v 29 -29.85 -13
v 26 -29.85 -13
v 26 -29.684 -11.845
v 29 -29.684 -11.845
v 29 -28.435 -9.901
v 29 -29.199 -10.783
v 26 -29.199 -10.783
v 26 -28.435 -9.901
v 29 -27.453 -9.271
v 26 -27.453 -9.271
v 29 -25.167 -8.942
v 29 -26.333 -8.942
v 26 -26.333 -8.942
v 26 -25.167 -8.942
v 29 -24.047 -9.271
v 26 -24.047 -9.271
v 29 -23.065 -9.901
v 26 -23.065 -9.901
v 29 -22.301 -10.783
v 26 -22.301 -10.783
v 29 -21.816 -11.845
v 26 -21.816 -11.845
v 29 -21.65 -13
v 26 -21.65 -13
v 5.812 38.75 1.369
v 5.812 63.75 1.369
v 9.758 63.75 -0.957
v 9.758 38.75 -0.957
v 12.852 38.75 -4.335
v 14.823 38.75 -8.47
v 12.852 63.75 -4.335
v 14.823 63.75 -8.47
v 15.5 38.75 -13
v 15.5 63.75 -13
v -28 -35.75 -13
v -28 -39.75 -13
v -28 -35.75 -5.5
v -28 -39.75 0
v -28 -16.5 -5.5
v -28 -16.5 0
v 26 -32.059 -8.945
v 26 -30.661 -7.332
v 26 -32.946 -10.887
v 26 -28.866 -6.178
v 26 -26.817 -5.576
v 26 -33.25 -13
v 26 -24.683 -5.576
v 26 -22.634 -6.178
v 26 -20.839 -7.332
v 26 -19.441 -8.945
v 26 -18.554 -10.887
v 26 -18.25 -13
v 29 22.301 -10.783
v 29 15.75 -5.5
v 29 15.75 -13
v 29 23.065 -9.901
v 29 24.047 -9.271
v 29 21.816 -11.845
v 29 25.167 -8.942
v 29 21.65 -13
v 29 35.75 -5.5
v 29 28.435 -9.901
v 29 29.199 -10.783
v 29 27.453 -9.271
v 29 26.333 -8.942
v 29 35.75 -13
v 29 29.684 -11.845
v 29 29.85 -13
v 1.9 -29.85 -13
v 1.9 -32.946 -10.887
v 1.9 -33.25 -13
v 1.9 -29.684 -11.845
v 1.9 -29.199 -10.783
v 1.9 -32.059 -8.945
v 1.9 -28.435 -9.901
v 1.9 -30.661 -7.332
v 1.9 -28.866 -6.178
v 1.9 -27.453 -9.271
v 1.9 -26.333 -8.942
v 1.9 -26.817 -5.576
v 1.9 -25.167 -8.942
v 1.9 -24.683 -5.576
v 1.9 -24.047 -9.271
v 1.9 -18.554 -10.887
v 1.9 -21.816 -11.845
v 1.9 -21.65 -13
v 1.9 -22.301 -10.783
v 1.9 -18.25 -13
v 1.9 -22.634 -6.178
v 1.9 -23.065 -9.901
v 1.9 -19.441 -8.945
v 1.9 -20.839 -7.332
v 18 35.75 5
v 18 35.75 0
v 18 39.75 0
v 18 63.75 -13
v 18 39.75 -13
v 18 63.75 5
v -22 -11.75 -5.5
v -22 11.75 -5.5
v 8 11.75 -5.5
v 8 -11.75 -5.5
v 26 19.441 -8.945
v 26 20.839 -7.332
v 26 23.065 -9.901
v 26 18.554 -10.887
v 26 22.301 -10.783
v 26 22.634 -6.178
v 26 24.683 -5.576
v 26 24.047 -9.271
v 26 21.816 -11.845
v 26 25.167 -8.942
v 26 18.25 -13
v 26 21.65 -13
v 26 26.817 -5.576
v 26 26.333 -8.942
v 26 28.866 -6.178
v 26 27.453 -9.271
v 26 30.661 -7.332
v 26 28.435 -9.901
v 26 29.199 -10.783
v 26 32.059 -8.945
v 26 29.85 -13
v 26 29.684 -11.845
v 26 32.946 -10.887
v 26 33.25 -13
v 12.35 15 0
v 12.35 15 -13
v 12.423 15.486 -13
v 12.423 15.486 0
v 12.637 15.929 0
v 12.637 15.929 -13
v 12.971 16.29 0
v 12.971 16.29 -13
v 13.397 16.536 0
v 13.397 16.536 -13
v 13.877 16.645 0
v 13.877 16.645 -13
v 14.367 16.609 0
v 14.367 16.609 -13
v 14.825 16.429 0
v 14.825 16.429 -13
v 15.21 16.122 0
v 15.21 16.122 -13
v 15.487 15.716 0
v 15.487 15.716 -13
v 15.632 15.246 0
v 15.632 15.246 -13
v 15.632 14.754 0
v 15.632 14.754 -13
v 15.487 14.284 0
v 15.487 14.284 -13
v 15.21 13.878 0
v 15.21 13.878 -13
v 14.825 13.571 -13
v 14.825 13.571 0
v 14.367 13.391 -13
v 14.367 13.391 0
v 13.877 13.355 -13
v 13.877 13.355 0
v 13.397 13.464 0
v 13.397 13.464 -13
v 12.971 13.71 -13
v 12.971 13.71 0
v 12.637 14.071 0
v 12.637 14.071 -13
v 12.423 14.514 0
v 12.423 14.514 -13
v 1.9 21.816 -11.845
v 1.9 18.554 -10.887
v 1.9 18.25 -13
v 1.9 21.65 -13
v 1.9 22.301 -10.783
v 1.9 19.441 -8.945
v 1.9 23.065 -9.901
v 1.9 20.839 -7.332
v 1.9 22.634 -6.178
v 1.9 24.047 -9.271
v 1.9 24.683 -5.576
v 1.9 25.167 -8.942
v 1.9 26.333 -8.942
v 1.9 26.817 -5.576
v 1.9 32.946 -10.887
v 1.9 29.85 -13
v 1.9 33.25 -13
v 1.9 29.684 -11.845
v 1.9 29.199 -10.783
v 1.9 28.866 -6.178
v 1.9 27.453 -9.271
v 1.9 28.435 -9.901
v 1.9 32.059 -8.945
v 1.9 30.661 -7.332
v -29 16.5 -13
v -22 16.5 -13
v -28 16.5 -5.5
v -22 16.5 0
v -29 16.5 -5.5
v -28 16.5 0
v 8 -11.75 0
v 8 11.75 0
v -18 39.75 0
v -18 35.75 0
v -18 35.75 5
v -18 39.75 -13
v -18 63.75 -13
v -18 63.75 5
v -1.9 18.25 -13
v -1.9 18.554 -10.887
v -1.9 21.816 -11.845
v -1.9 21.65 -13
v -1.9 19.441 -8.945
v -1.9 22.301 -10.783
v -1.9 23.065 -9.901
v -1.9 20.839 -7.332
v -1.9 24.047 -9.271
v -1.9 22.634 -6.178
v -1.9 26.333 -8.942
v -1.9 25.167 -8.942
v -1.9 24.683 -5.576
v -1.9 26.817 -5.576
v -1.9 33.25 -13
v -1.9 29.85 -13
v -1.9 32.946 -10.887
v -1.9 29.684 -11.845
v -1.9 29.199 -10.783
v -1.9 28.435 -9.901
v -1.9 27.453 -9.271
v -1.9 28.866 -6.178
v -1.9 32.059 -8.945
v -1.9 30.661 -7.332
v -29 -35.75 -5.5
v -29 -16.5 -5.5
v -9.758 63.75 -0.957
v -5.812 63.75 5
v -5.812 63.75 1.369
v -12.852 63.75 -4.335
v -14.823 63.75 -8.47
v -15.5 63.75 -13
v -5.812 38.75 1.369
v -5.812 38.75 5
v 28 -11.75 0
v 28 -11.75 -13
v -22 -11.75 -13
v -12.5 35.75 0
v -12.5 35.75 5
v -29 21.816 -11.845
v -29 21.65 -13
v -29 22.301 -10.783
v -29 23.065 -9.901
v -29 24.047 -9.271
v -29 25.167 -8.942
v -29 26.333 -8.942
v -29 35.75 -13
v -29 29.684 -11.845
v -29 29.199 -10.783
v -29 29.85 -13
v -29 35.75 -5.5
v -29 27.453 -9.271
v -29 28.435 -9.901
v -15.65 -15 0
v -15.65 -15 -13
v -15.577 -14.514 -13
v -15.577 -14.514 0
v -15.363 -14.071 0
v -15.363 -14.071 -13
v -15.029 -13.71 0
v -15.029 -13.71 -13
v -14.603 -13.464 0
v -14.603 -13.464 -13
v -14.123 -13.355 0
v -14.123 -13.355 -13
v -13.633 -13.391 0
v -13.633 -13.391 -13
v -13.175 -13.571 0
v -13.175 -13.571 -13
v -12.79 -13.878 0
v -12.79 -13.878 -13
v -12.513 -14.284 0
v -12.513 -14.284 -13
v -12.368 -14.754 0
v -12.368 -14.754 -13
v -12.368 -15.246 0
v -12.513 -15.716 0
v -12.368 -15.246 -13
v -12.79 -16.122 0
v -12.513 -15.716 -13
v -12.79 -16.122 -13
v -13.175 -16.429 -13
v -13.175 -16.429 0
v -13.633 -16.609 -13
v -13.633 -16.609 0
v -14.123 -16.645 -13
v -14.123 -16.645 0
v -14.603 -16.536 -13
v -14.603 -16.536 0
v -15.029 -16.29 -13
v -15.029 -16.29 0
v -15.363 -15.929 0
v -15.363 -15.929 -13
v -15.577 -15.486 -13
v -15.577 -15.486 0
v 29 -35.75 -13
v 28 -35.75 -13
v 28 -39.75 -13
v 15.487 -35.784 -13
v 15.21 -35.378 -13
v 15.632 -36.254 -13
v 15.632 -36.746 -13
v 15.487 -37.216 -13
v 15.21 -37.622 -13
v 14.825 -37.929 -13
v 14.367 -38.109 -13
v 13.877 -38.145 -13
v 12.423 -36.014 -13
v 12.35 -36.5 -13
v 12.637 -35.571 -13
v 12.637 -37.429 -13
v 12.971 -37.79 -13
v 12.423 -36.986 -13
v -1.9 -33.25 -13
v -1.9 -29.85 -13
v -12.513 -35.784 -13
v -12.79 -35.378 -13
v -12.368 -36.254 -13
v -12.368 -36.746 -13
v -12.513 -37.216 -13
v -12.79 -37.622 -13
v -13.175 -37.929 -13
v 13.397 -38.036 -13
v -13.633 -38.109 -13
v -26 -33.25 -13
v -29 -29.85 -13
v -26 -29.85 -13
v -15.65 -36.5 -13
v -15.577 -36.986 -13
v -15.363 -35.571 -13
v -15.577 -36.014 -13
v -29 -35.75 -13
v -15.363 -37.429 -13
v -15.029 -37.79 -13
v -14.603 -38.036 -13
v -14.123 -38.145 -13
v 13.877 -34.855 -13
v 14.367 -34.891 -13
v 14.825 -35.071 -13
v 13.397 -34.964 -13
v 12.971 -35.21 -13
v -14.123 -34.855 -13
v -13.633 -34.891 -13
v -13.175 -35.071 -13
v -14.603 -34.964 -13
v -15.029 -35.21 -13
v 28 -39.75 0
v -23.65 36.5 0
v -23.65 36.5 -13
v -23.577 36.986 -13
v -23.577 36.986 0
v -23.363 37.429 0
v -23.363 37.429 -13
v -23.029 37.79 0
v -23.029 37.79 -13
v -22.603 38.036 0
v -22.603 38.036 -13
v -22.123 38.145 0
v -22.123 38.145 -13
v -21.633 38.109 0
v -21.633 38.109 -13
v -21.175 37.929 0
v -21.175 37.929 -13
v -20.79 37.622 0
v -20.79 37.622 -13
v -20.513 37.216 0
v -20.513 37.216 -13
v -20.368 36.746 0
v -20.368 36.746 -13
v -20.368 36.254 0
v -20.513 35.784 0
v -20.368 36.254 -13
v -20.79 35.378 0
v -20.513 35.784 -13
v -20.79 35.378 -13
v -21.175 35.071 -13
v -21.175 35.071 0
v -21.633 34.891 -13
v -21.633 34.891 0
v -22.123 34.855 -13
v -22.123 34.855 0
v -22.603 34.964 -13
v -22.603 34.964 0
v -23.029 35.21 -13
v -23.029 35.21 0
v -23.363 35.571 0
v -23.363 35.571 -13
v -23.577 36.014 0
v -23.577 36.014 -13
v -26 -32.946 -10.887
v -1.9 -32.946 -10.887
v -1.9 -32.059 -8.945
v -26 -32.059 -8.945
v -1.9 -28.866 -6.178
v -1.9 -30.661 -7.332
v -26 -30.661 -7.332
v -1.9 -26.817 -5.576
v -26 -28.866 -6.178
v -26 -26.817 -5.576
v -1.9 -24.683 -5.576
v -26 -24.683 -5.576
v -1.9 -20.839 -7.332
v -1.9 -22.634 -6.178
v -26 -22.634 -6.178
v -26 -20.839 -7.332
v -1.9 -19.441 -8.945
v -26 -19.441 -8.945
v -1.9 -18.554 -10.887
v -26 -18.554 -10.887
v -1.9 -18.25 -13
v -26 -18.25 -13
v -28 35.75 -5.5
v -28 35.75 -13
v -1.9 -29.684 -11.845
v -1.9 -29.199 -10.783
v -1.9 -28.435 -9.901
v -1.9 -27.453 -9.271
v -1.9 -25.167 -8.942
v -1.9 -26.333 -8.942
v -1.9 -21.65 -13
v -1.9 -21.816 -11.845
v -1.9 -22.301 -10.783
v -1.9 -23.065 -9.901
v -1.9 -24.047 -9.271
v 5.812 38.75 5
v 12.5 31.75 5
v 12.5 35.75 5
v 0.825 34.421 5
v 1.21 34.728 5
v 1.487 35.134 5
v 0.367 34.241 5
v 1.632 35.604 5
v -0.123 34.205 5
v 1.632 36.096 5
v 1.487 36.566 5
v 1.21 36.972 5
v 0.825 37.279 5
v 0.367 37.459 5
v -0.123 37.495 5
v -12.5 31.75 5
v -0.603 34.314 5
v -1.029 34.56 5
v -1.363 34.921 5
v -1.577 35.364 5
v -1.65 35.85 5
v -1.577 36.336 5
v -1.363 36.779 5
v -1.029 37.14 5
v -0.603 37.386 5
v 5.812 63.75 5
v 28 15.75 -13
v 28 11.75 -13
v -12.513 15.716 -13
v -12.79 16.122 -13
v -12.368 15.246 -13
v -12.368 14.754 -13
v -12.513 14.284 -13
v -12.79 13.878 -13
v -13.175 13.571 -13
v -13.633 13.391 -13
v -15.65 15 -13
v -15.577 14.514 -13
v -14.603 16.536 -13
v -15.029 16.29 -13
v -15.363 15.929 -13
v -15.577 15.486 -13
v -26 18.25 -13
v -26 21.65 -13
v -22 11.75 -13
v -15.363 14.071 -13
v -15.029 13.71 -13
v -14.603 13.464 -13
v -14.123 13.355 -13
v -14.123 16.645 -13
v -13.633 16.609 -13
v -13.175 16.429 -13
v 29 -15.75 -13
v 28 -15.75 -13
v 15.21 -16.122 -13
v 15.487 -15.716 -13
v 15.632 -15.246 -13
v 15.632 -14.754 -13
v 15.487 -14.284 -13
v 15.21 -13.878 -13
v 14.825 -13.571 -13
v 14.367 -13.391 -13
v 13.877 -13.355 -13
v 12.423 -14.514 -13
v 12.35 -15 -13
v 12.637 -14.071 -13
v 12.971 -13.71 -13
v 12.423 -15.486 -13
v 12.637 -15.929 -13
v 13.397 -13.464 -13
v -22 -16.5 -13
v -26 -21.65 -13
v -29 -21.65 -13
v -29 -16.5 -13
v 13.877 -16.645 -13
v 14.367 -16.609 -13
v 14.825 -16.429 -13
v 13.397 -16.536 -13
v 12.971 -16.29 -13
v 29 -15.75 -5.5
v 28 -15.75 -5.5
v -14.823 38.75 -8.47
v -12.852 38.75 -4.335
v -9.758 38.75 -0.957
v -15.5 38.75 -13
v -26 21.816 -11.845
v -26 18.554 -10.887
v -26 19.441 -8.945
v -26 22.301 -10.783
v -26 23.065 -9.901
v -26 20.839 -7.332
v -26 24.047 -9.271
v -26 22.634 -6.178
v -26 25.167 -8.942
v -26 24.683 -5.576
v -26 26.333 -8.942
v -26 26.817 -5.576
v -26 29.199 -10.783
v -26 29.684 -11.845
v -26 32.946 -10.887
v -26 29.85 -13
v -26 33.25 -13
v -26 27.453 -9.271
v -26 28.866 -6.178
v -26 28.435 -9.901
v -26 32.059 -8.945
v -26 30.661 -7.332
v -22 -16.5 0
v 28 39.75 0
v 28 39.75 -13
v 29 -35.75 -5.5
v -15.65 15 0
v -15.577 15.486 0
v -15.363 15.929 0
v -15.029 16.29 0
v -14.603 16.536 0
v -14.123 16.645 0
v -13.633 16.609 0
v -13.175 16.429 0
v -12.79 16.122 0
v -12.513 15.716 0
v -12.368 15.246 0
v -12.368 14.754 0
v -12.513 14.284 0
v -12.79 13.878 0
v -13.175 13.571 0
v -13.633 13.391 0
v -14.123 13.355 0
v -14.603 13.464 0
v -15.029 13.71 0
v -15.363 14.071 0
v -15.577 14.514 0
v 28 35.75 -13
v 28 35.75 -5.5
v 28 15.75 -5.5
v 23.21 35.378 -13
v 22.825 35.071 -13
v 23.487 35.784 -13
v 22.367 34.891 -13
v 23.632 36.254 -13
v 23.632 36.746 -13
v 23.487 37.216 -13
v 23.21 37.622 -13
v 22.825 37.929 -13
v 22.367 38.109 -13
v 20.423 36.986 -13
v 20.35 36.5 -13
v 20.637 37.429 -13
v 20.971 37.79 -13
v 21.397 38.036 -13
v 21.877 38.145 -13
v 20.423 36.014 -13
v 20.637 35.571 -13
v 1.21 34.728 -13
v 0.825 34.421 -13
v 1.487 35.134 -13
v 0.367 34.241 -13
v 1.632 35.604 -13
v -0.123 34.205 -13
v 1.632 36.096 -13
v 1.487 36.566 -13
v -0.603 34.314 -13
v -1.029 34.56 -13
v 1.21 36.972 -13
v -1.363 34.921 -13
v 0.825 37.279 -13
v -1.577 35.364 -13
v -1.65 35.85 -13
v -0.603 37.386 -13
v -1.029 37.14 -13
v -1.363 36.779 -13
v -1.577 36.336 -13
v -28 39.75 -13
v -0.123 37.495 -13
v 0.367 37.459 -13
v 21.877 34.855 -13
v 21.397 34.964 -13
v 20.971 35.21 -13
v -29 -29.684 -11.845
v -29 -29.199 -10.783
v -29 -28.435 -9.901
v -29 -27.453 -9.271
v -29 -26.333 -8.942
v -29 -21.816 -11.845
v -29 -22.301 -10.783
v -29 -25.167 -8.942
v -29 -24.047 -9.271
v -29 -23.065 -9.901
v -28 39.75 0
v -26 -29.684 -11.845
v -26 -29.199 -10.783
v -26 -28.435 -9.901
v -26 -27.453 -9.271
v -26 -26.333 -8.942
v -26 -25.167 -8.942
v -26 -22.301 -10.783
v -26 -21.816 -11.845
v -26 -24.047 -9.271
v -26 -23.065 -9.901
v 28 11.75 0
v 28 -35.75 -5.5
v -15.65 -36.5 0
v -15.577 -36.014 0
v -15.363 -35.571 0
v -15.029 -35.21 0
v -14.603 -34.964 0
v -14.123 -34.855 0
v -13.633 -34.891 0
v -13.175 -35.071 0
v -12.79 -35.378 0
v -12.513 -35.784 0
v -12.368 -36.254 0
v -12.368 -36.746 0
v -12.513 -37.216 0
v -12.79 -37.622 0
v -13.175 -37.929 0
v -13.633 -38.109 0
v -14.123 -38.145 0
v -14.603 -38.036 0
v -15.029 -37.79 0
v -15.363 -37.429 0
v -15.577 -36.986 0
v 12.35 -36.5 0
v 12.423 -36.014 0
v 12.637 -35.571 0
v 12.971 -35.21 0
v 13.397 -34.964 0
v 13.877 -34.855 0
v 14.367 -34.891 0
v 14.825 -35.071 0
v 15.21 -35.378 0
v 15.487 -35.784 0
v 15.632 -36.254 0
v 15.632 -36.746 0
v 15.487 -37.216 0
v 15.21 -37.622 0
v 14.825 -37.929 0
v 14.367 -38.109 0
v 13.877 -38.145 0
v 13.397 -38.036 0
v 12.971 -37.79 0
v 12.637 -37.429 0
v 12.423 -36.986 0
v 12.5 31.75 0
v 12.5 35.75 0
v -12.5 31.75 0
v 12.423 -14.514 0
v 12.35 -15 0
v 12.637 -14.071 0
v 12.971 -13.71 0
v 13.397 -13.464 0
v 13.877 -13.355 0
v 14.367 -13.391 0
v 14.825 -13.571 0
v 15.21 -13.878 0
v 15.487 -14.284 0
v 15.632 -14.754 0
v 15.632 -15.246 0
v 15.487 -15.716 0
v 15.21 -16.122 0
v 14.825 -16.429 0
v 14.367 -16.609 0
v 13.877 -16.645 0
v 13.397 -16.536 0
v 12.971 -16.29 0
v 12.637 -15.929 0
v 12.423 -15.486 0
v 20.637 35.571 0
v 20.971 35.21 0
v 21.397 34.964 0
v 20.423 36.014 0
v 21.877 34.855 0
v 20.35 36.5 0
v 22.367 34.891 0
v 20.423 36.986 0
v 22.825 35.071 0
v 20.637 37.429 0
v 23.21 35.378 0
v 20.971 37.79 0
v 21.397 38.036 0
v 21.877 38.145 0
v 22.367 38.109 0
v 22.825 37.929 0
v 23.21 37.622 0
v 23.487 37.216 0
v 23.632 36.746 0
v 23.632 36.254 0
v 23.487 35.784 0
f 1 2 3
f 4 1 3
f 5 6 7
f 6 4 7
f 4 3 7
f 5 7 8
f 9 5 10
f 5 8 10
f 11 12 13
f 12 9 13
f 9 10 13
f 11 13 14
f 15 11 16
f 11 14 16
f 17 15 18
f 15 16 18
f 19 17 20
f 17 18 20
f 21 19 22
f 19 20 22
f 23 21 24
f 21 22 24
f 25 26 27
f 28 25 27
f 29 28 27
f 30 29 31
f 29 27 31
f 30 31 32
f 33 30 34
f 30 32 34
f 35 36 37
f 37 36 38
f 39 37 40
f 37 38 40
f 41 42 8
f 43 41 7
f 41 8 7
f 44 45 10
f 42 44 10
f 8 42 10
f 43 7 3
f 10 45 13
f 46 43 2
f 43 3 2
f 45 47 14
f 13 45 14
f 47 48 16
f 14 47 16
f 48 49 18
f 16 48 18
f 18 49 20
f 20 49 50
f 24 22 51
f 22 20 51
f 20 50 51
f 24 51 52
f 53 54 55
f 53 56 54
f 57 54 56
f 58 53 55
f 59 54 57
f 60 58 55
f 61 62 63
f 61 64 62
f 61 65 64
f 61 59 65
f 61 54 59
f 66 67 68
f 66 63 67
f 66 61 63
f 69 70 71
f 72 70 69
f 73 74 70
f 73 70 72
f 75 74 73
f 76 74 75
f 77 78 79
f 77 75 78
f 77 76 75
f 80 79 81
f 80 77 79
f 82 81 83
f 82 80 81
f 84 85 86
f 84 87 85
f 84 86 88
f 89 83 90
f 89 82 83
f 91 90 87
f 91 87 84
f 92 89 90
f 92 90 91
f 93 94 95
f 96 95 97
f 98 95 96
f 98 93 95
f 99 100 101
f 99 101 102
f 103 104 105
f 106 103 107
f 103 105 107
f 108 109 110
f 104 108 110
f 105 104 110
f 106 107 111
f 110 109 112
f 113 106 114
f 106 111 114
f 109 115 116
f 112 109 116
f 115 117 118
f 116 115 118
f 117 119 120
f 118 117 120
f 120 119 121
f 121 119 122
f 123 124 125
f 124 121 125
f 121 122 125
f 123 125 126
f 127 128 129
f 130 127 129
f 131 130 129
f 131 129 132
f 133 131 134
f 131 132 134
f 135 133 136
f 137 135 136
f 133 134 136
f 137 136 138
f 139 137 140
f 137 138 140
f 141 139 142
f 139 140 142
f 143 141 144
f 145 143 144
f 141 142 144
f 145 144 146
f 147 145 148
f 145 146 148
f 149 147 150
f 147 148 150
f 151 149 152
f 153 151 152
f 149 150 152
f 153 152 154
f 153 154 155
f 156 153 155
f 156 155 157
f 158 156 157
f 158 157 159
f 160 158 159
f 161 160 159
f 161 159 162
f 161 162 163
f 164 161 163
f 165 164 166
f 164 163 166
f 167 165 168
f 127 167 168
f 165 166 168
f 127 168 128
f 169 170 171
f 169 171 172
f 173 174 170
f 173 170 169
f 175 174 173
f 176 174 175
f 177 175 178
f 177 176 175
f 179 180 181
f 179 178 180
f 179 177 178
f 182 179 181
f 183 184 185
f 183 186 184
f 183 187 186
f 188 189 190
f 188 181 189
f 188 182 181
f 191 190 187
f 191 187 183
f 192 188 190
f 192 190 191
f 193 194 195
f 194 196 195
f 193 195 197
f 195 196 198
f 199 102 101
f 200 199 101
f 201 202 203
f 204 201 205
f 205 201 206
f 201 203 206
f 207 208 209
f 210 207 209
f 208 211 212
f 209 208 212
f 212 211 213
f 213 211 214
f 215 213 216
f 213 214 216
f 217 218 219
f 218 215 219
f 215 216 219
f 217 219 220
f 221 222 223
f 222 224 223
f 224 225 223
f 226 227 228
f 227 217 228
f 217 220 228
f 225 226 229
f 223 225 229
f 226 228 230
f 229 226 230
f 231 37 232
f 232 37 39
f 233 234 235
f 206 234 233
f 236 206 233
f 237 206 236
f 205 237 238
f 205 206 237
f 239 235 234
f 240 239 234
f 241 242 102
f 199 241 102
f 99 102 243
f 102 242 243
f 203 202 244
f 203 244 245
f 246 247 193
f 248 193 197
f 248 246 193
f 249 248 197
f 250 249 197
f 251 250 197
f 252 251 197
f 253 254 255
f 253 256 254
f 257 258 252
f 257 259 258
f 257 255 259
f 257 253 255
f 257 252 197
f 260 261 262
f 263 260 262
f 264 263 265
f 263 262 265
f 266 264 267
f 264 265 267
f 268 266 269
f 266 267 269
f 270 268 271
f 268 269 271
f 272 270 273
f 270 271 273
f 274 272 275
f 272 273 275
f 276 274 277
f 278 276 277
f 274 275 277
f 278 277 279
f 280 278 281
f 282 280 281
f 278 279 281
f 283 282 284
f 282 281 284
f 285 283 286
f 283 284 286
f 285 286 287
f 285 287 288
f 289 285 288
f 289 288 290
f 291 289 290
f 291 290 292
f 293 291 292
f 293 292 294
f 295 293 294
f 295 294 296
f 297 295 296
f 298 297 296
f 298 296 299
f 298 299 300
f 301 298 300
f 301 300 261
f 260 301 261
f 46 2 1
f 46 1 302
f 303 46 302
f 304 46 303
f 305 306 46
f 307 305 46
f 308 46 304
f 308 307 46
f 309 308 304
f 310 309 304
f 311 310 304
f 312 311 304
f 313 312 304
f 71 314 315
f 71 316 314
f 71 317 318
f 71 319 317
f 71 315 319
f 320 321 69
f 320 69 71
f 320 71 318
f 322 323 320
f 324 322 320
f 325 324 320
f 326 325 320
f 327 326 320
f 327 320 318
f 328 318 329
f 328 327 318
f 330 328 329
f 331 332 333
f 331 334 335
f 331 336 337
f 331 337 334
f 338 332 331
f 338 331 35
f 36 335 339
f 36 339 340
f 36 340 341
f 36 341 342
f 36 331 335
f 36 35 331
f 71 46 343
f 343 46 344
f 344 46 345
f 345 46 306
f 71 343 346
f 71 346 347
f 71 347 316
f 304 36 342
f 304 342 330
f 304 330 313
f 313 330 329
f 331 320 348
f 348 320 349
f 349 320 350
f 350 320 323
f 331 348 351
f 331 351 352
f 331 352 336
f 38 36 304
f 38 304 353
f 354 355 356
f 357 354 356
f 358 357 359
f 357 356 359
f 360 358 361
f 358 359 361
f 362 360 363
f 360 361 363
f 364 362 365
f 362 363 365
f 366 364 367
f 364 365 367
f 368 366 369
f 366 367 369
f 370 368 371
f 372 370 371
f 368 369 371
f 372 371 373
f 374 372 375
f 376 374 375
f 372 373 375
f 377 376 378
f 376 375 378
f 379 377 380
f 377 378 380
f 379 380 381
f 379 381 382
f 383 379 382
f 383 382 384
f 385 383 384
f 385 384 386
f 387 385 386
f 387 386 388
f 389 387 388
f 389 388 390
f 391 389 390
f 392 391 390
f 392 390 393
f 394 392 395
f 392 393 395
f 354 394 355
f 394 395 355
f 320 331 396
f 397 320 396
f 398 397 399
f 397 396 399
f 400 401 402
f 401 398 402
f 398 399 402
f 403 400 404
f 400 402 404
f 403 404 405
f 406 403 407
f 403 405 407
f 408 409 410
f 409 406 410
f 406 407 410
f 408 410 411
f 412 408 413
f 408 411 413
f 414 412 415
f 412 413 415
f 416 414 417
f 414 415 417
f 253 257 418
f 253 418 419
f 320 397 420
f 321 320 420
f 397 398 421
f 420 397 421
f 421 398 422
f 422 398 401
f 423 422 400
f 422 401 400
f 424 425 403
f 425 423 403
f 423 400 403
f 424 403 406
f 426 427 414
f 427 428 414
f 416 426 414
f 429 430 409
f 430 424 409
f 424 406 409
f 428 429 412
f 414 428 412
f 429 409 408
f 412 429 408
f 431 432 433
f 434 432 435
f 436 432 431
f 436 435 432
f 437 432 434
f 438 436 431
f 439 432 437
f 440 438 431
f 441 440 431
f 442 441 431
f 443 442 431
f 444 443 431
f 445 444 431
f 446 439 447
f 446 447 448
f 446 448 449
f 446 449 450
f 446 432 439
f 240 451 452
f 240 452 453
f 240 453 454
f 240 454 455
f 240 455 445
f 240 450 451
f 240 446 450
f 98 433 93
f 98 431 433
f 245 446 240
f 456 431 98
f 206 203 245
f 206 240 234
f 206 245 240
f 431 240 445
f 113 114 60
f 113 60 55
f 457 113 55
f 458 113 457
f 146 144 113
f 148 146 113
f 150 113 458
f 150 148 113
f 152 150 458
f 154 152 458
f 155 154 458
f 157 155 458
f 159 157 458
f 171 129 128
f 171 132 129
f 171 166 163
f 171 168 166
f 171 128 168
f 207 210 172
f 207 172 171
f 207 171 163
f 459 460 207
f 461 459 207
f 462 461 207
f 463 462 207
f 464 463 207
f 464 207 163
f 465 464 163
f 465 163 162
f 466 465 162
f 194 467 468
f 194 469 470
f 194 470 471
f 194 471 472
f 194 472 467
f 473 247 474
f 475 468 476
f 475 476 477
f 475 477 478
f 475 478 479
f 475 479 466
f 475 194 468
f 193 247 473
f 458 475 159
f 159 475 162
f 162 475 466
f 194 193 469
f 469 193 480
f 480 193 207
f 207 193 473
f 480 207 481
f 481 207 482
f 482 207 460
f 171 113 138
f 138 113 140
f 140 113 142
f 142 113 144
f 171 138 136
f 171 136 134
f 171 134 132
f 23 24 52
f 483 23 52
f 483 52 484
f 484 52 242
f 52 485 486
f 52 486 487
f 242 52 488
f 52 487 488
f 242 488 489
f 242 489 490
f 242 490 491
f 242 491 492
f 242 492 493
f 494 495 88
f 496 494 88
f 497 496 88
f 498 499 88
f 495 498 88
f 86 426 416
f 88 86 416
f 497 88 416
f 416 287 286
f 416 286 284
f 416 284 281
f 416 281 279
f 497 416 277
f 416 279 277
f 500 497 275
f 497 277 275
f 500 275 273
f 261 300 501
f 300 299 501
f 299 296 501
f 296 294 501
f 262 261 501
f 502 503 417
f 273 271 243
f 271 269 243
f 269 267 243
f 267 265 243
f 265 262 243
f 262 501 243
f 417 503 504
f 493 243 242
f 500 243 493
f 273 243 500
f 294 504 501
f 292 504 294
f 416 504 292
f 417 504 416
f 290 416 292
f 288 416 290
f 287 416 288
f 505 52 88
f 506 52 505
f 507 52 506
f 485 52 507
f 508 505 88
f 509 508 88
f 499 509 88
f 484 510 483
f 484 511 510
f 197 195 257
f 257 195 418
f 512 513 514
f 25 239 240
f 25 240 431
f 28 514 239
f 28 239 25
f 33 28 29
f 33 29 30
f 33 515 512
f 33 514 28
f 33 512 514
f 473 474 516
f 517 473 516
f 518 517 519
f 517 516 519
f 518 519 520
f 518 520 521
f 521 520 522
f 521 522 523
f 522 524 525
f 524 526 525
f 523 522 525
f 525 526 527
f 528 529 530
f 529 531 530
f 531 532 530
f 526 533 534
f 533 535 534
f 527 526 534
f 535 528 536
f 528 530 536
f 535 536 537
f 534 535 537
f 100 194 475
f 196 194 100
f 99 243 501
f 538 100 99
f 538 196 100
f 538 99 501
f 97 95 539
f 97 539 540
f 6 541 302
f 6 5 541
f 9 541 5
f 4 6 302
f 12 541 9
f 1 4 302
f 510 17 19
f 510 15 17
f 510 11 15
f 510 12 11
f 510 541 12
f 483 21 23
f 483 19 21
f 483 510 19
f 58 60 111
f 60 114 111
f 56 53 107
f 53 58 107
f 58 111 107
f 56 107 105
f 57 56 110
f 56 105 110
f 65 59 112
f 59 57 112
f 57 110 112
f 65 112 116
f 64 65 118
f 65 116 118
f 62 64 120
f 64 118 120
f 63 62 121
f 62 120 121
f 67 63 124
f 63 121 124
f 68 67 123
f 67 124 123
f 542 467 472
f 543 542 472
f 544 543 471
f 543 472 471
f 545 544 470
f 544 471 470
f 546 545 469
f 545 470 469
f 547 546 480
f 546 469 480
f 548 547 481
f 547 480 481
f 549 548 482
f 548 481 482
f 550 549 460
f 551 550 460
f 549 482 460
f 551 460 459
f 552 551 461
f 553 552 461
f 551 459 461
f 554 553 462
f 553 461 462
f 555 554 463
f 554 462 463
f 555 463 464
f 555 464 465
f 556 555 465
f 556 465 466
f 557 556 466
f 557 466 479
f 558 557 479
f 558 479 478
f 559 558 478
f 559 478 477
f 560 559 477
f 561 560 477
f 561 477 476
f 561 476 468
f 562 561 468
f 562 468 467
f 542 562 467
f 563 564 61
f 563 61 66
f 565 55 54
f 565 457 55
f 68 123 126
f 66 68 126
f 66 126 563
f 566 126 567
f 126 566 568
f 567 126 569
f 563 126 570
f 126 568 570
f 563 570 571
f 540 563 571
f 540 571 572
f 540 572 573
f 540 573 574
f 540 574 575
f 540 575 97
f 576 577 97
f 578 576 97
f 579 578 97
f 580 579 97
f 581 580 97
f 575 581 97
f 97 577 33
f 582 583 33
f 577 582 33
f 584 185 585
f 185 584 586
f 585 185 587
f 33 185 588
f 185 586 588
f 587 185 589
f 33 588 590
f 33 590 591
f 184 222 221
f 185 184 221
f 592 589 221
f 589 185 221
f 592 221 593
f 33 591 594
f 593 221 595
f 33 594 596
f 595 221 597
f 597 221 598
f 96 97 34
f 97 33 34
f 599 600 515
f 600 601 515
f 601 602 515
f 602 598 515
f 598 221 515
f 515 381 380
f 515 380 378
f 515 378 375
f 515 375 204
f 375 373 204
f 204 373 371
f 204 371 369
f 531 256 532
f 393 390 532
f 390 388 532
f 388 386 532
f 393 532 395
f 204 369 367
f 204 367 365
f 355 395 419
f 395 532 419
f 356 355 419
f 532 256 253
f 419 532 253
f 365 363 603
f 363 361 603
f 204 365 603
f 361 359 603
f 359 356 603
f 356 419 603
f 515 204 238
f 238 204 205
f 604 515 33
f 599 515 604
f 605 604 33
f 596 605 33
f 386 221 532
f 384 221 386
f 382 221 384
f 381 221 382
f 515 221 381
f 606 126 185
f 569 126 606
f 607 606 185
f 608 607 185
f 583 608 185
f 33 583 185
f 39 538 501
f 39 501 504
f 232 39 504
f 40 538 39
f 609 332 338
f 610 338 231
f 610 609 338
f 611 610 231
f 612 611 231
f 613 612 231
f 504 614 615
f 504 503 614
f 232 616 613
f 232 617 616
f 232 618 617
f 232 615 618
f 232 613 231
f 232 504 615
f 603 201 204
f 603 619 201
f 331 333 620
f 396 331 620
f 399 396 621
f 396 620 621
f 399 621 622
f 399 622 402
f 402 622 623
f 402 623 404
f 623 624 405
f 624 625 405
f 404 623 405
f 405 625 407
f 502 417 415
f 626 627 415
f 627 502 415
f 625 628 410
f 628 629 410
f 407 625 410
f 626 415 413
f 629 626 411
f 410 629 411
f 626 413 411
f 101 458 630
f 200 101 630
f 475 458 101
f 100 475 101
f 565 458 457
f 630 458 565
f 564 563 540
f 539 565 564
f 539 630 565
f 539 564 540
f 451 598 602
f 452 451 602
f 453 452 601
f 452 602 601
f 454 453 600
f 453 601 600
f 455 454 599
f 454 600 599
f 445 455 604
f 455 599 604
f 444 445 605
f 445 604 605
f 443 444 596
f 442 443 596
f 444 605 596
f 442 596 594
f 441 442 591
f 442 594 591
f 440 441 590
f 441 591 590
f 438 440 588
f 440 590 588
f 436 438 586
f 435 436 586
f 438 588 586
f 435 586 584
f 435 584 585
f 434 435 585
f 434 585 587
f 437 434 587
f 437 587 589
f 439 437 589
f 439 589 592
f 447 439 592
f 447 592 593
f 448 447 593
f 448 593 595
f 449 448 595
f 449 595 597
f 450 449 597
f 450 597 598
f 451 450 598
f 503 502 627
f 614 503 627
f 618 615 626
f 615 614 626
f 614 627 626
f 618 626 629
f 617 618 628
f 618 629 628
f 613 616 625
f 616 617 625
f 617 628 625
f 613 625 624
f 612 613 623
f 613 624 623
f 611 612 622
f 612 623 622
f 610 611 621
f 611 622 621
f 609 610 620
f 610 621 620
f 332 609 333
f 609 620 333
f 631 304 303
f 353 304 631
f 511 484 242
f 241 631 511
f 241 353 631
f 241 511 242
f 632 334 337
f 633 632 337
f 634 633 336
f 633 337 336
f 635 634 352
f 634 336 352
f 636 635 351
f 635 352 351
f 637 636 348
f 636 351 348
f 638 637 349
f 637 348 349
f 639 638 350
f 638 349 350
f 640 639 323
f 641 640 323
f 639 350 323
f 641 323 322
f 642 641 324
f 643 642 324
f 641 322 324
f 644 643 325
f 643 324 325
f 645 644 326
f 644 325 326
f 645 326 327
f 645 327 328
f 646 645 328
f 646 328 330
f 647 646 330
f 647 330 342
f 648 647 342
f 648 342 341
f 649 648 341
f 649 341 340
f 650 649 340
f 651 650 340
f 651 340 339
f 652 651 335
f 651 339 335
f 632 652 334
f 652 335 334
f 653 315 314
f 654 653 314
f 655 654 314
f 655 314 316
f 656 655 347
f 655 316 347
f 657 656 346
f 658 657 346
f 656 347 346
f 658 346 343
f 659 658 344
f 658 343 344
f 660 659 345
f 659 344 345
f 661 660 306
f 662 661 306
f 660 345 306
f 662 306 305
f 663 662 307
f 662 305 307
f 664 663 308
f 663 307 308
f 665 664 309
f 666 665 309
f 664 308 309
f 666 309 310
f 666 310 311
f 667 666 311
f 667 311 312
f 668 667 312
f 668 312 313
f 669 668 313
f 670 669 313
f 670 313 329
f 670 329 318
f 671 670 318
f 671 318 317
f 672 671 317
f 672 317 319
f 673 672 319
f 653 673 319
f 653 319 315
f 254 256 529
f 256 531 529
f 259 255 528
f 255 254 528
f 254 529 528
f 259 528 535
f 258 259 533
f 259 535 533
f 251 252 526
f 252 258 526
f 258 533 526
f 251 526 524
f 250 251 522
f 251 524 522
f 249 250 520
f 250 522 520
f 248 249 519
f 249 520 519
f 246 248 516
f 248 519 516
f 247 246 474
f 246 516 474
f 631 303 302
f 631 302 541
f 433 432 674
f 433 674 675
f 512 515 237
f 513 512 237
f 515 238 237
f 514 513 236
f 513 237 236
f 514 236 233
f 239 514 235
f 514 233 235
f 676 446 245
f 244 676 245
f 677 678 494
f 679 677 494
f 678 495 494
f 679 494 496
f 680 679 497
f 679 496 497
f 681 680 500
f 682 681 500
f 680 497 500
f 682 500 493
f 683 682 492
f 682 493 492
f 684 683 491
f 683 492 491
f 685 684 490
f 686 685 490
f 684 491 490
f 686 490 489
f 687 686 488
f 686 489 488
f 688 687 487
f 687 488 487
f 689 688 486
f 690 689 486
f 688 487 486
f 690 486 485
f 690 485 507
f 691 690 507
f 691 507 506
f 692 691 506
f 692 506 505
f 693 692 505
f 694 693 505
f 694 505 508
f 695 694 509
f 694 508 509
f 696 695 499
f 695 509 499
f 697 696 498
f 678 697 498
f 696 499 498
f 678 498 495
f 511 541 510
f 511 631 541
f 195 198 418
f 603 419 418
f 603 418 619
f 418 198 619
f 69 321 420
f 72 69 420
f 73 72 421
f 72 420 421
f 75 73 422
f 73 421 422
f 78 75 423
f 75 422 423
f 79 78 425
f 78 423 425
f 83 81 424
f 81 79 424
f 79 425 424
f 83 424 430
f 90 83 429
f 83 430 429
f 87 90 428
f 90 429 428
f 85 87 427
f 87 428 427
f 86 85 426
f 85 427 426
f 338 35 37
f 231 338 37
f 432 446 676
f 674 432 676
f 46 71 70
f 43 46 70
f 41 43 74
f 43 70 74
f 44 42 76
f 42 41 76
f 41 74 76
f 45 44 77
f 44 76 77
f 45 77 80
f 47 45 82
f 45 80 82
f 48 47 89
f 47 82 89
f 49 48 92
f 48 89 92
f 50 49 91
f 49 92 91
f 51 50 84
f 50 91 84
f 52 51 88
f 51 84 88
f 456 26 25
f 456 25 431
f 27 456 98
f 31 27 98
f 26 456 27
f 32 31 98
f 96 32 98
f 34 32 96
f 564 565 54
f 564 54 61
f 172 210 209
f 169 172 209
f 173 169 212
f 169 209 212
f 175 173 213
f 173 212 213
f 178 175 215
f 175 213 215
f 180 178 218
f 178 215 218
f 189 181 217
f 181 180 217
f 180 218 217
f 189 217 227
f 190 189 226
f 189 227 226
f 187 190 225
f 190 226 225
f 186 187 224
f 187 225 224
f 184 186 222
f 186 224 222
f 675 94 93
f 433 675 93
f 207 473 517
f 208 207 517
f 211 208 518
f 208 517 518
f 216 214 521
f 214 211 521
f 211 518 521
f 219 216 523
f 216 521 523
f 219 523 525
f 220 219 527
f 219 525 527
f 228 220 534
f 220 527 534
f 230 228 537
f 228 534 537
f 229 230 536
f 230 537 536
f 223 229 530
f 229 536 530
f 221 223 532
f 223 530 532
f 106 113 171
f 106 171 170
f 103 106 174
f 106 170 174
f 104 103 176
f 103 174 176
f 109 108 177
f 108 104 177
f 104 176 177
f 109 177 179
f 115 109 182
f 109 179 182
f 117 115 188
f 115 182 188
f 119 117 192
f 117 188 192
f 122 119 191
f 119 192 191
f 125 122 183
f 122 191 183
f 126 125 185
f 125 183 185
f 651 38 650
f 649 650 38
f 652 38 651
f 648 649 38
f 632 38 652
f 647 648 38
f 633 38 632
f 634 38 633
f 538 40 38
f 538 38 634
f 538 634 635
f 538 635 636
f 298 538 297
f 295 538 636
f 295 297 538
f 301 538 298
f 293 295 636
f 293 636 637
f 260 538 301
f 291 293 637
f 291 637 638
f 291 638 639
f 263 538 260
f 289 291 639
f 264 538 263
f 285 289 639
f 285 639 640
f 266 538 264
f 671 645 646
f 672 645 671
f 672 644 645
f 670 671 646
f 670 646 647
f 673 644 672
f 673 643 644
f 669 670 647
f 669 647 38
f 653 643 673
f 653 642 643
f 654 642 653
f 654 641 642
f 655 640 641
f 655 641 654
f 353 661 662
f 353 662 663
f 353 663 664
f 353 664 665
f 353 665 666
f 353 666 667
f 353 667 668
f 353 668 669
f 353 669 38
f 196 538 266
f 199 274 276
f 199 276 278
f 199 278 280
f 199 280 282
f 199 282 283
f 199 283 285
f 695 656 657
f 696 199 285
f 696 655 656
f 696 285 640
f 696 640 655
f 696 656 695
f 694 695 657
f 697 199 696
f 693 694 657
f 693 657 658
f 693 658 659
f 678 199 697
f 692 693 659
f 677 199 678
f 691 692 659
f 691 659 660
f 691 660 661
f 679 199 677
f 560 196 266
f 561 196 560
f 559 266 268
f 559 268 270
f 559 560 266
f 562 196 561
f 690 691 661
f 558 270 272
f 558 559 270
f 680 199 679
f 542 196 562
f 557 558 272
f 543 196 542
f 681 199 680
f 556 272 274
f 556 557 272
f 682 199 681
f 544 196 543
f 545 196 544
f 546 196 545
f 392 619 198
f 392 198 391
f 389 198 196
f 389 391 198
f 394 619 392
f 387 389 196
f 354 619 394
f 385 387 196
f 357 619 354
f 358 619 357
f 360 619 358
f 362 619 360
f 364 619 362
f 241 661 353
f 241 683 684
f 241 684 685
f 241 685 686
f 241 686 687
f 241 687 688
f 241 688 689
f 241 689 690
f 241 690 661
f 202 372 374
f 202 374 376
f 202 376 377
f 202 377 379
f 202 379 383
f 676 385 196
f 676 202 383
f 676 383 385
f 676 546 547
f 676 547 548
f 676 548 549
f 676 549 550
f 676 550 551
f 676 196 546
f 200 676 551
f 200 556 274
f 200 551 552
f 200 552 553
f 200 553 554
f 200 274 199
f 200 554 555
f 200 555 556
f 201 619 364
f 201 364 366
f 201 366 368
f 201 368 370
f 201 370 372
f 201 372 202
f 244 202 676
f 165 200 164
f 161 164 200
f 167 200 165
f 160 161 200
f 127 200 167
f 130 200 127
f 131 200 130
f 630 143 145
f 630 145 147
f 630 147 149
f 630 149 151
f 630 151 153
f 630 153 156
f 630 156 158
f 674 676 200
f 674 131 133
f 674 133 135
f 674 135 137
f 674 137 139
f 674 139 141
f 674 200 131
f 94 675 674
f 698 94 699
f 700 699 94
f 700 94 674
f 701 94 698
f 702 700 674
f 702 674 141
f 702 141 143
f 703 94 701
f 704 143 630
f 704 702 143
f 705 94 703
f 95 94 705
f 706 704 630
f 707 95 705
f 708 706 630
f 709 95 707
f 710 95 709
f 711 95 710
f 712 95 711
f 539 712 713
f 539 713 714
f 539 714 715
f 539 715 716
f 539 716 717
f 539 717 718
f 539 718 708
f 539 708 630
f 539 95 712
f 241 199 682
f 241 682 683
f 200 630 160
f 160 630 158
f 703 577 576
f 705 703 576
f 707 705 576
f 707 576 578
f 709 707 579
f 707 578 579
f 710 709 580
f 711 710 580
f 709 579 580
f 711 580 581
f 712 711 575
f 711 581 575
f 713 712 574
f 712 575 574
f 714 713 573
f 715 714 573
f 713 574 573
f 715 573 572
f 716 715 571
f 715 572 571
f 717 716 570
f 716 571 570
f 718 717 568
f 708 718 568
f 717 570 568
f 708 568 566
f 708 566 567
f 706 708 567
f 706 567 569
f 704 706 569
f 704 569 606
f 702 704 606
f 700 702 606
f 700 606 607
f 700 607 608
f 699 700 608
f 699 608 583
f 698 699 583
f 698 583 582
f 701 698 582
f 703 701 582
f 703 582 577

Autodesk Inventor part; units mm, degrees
ref_plane "YZ Plane" through (0, 0, 0) normal (1, 0, 0) x (0, 1, 0)
ref_plane "XZ Plane" through (0, 0, 0) normal (0, 1, 0) x (-1, 0, 0)
sketch "스케치1" plane through (0, 0, 0) normal (1, 0, 0) x (0, 1, 0)
  arc A0 (33.25, -13) -> (18.25, -13) centre (25.75, -13) ccw
  arc A1 (-18.25, -13) -> (-33.25, -13) centre (-25.75, -13) ccw
  line L0 (-37.5, 0) -> (35.75, 0)
  line L1 (33.25, -13) -> (35.75, -13)
  line L2 (18.25, -13) -> (15.75, -13)
  line L3 (15.75, -13) -> (15.75, -5.5)
  line L4 (-18.25, -13) -> (-15.75, -13)
  line L5 (-15.75, -13) -> (-15.75, -5.5)
  line L6 (-33.25, -13) -> (-35.75, -13)
  line L7 (-35.75, -13) -> (-35.75, -5.5)
  line L8 (-15.75, -13) -> (-11.75, -13)
  line L9 (-11.75, -13) -> (-11.75, -5.5)
  line L10 (-35.75, -13) -> (-39.75, -13)
  line L11 (-39.75, -13) -> (-39.75, -5.5)
  line L12 (15.75, -13) -> (11.75, -13)
  line L13 (11.75, -13) -> (11.75, -5.5)
  line L14 (35.75, -13) -> (39.75, -13)
  line L15 (25.75, -5.5) -> (15.75, -5.5)
  line L16 (35.75, -5.5) -> (25.75, -5.5)
  line L17 (15.75, -5.5) -> (11.75, -5.5)
  line L18 (11.75, -5.5) -> (-11.75, -5.5)
  line L19 (-15.75, -5.5) -> (-25.75, -5.5)
  line L20 (-35.75, -5.5) -> (-25.75, -5.5)
  line L21 (-11.75, -5.5) -> (-15.75, -5.5)
  arc A2 (29.85, -13) -> (21.65, -13) centre (25.75, -13) ccw
  line L22 (33.25, -13) -> (29.85, -13)
  line L23 (21.65, -13) -> (18.25, -13)
  arc A3 (-21.65, -13) -> (-29.85, -13) centre (-25.75, -13) ccw
  line L24 (-18.25, -13) -> (-21.65, -13)
  line L25 (-29.85, -13) -> (-33.25, -13)
  line L26 (29.85, -13) -> (21.65, -13)
  line L27 (-21.65, -13) -> (-29.85, -13)
  line L28 (35.75, 2) -> (60.75, 2)
  line L29 (60.75, 2) -> (60.75, -13)
  line L30 (35.75, 2) -> (35.75, 0)
  line L31 (35.75, 2) -> (35.75, 5)
  line L32 (35.75, 5) -> (60.75, 5)
  line L33 (60.75, 5) -> (63.75, 5)
  line L34 (63.75, 5) -> (63.75, 2)
  line L35 (63.75, 2) -> (63.75, -13)
  line L36 (63.75, -13) -> (60.75, -13)
  line L37 (-37.5, 0) -> (-39.75, 0)
  line L38 (-39.75, 0) -> (-39.75, -5.5)
  line L39 (-35.75, -5.5) -> (-35.75, 0)
  line L40 (39.75, 0) -> (39.75, -13)
  line L41 (35.75, 0) -> (35.75, -5.5)
  line L42 (35.75, -13) -> (35.75, -5.5)
  line L43 (39.75, 0) -> (39.75, 2)
  line L44 (60.75, -13) -> (39.75, -13)
  line L45 (35.75, 5) -> (31.75, 5)
  line L46 (31.75, 5) -> (31.75, 0)
  line L47 (39.75, 0) -> (35.75, 0)
  point P0 (0, 0)
  dimension "d1" = 37.5
  dimension "d8" = 2.5
  dimension "d10" = 2.5
  dimension "d11" = 4
  dimension "d12" = 4
  dimension "d13" = 4
  dimension "d28" = 8.2
  dimension "d29" = 8.2
  dimension "d37" = 25
  dimension "d38" = 3
  dimension "d39" = 3
  dimension "d81" = 4
extrude "돌출1" add sketch "스케치1" along normal mid plane 56 contours L15 L17 L18 L21 L19 L20 L39 L0 L41 L16
extrude "돌출3" add sketch "스케치1" along normal mid plane 56 contours L3 L12 L13 L17 | L9 L8 L5 L21
extrude "돌출4" add sketch "스케치1" along normal mid plane 56 contours L15 L17 L18 L21 L19 L20 L39 L0 L41 L16 | L39 L7 L10 L11 L38 L37 L0
extrude "돌출5" add sketch "스케치1" along normal mid plane 52 contours A0 L16 L42 L1 | A0 L2 L3 L15 | L5 L4 A1 L19 | A1 L6 L7 L20
extrude "돌출6" add sketch "스케치1" along normal mid plane 3.8 contours L22 A2 L23 A0 | A1 L24 A3 L25
sketch "스케치3" plane through (26, 0, 0) normal (1, 0, 0) x (0, 0, -1)
  line L0 (5.5, 15.75) -> (5.5, 35.75) projected
  line L1 (13, 11.75) -> (13, 15.75) projected
  line L2 (5.5, 35.75) -> (13, 35.75)
  line L3 (13, 15.75) -> (5.5, 15.75)
  line L4 (5.5, 15.75) -> (5.5, 35.75)
  line L5 (13, 18.25) -> (13, 21.65) projected
  arc A0 (13, 29.85) -> (13, 21.65) centre (13, 25.75) ccw
  line L6 (13, 35.75) -> (13, 29.85)
  line L7 (13, 21.65) -> (13, 15.75)
  line L8 (5.5, -15.75) -> (13, -15.75) projected
  line L9 (13, -35.75) -> (13, -39.75) projected
  line L10 (5.5, -15.75) -> (13, -15.75)
  line L11 (13, -35.75) -> (5.5, -35.75)
  line L12 (5.5, -35.75) -> (5.5, -15.75)
  line L13 (13, -33.25) -> (13, -29.85) projected
  arc A1 (13, -21.65) -> (13, -29.85) centre (13, -25.75) ccw
  line L14 (13, -15.75) -> (13, -21.65)
  line L15 (13, -29.85) -> (13, -35.75)
  point P0 (0, 0)
extrude "돌출8" add sketch "스케치3" along normal blind 3
sketch "스케치4" plane through (-26, 0, 0) normal (-1, 0, 0) x (0, 0, 1)
  line L0 (-13, -33.25) -> (-13, -35.75) projected
  line L1 (-5.5, -15.75) -> (-13, -15.75)
  line L2 (-13, -15.75) -> (-13, -35.75)
  line L3 (-13, -35.75) -> (-5.5, -35.75)
  line L4 (-5.5, -35.75) -> (-5.5, -15.75)
  line L5 (-13, 11.75) -> (-13, 15.75) projected
  line L6 (-5.5, 35.75) -> (0, 35.75) projected
  line L7 (-13, 15.75) -> (-5.5, 15.75)
  line L8 (-5.5, 15.75) -> (-5.5, 35.75)
  line L9 (-5.5, 35.75) -> (-13, 35.75)
  arc A0 (-13, -29.85) -> (-13, -21.65) centre (-13, -25.75) ccw
  arc A1 (-13, 21.65) -> (-13, 29.85) centre (-13, 25.75) ccw
  line L10 (-13, 35.75) -> (-13, 29.85)
  line L11 (-13, 21.65) -> (-13, 15.75)
  point P0 (0, 0)
extrude "돌출9" add sketch "스케치4" along normal blind 3 contours L2 A0 L1 L4 L3 L0 | L11 A1 L10 L9 L8 L7
extrude "돌출10" add sketch "스케치1" along normal mid plane 36 contours A0 L16 L42 L1 | L29 L28 L31 L32 L33 L34 L35 L36
sketch "스케치5" plane through (-18, 63.75, 5) normal (0, 1, 0) x (1, 0, 0)
  line L0 (0, 18) -> (36, 18) projected
  arc A0 (2.5, 18) -> (33.5, 18) centre (18, 18) ccw
  line L1 (18, 18) -> (2.5, 18)
  line L2 (-10, 18) -> (46, 18) projected
  line L3 (18, 18) -> (33.5, 18)
  line L4 (-10, 5) -> (46, 5) projected
  line L5 (23.8125, 3.6311) -> (23.8125, 0)
  line L6 (23.8125, 3.6311) -> (12.1875, 3.6311)
  line L7 (12.1875, 0) -> (23.8125, 0)
  line L8 (12.1875, 3.6311) -> (12.1875, 0)
  point P0 (18, 5)
  dimension "d43" = 31
sketch "스케치6" plane through (28, 11.75, -13) normal (0, 0, -1) x (-1, 0, 0)
  line L0 (28, 0) -> (28, 3.25)
  line L1 (28, 3.25) -> (14, 3.25)
  line L2 (28, 3.25) -> (42, 3.25)
  circle A0 centre (42, 3.25) radius 1.65
  circle A1 centre (14, 3.25) radius 1.65
  line L3 (28, 24.75) -> (6, 24.75)
  line L4 (28, 24.75) -> (50, 24.75)
  circle A2 centre (6, 24.75) radius 1.65
  circle A3 centre (50, 24.75) radius 1.65
  line L5 (28, 21.5) -> (28, 24.1)
  circle A4 centre (28, 24.1) radius 1.65
  line L6 (0, -23.5) -> (56, -23.5) projected
  line L7 (28, -23.5) -> (28, -26.75)
  line L8 (28, -26.75) -> (42, -26.75)
  line L9 (28, -26.75) -> (14, -26.75)
  line L10 (56, -51.5) -> (0, -51.5) projected
  line L11 (28, -51.5) -> (28, -48.25)
  line L12 (28, -48.25) -> (42, -48.25)
  line L13 (28, -48.25) -> (14, -48.25)
  circle A5 centre (14, -26.75) radius 1.65
  circle A6 centre (42, -26.75) radius 1.65
  circle A7 centre (42, -48.25) radius 1.65
  circle A8 centre (14, -48.25) radius 1.65
  point P0 (28, -11.75)
  dimension "d46" = 3.25
  dimension "d47" = 14
  dimension "d48" = 14
  dimension "d54" = 3.3
  dimension "d55" = 3.3
  dimension "d58" = 22
  dimension "d59" = 3.3
  dimension "d60" = 3.3
  dimension "d61" = 2.6
  dimension "d62" = 3.3
  dimension "d63" = 3.25
  dimension "d64" = 14
  dimension "d65" = 14
  dimension "d66" = 3.25
  dimension "d67" = 14
  dimension "d68" = 14
  dimension "d69" = 3.3
  dimension "d70" = 3.3
  dimension "d71" = 3.3
  dimension "d72" = 3.3
extrude "돌출13" add sketch "스케치1" along normal mid plane 56 contours L42 L41 L47 L40 L14 | L30 L28 L43 L47
extrude "돌출14" add sketch "스케치1" along normal mid plane 36 contours L40 L43 L28 L29 L44
extrude "돌출15" cut sketch "스케치5" against normal blind 25 contours L0 A0 L4 | L4 A0 L6 | L6 A0
extrude "돌출16" add sketch "스케치1" along normal mid plane 25 contours L0 L46 L45 L31 L30
extrude "돌출17" cut sketch "스케치6" against normal blind 20
sketch "스케치7" plane through (-28, 39.75, 2) normal (0, 0, 1) x (1, 0, 0)
  line L0 (0, -79.5) -> (0, -4) projected
  line L1 (0, 0) -> (10, 0) projected
  line L2 (0, -4) -> (10, -4)
  line L3 (10, -4) -> (10, 0)
  line L4 (10, 0) -> (0, 0)
  line L5 (0, 0) -> (0, -4)
  line L6 (46, -4) -> (46, 0) projected
  line L7 (46, -4) -> (56, -4)
  line L8 (56, -4) -> (56, 0)
  line L9 (56, 0) -> (46, 0)
  line L10 (46, 0) -> (46, -4)
  point P0 (28, -39.75)
extrude "돌출18" cut sketch "스케치7" against normal blind 2
sketch "스케치8" plane through (28, 11.75, -5.5) normal (0, 0, -1) x (-1, 0, 0)
  line L0 (0, -23.5) -> (56, -23.5) projected
  line L1 (46, -23.5) -> (41, -23.5)
  line L2 (56, -23.5) -> (0, -23.5) projected
  line L3 (0, -23.5) -> (6, -23.5)
  line L4 (6, -23.5) -> (6, 0)
  line L5 (0, -23.5) -> (0, 0) projected
  line L6 (0, 0) -> (0, -23.5)
  line L7 (0, 0) -> (6, 0)
  line L8 (6, -1.75) -> (0, -1.75)
  line L9 (6, -8.25) -> (0, -8.25)
  line L10 (6, -15.25) -> (0, -15.25)
  line L11 (6, -21.75) -> (0, -21.75)
  line L12 (57, -11.75) -> (50, -11.75)
  line L13 (50, -11.75) -> (50, 4.75)
  line L14 (50, 4.75) -> (57, 4.75)
  line L15 (50, 4.75) -> (57, 4.75)
  line L16 (57, -11.75) -> (57, 4.75)
  line L17 (50, -11.75) -> (50, -28.25)
  line L18 (50, -28.25) -> (57, -28.25)
  line L19 (57, -11.75) -> (57, -28.25)
  line L20 (56, 0) -> (56, -23.5) projected
  point P0 (28, -11.75)
  dimension "d115" = 6
  dimension "d147" = 7
  dimension "d148" = 16.5
  dimension "d149" = 16.5
ref_plane "작업 평면3" through (28, 11.75, -13) normal (0, 0, -1) x (-1, 0, 0)
extrude "돌출28" cut sketch "스케치5" against normal blind 25 contours A0 L5 L7 L8
extrude "돌출29" cut sketch "스케치8" along normal mid plane 20 contours L17 L12 L20 L0 | L0 L20 L12 L19 L18 L17 | L13 L14 L16 L12
sketch "스케치15" plane through (28, -11.75, -5.5) normal (0, 0, -1) x (-1, 0, 0)
  line L0 (0, -4) -> (0, 0) projected
  line L1 (50, 23.5) -> (0, 23.5) projected
  line L2 (0, 0) -> (20, 0)
  line L3 (20, 0) -> (20, 23.5)
  line L4 (20, 23.5) -> (0, 23.5)
  line L5 (0, 23.5) -> (0, 0)
  point P0 (28, 11.75)
  dimension "d152" = 20
extrude "돌출30" cut sketch "스케치15" against normal blind 10
properties part number "x 캐리지"
